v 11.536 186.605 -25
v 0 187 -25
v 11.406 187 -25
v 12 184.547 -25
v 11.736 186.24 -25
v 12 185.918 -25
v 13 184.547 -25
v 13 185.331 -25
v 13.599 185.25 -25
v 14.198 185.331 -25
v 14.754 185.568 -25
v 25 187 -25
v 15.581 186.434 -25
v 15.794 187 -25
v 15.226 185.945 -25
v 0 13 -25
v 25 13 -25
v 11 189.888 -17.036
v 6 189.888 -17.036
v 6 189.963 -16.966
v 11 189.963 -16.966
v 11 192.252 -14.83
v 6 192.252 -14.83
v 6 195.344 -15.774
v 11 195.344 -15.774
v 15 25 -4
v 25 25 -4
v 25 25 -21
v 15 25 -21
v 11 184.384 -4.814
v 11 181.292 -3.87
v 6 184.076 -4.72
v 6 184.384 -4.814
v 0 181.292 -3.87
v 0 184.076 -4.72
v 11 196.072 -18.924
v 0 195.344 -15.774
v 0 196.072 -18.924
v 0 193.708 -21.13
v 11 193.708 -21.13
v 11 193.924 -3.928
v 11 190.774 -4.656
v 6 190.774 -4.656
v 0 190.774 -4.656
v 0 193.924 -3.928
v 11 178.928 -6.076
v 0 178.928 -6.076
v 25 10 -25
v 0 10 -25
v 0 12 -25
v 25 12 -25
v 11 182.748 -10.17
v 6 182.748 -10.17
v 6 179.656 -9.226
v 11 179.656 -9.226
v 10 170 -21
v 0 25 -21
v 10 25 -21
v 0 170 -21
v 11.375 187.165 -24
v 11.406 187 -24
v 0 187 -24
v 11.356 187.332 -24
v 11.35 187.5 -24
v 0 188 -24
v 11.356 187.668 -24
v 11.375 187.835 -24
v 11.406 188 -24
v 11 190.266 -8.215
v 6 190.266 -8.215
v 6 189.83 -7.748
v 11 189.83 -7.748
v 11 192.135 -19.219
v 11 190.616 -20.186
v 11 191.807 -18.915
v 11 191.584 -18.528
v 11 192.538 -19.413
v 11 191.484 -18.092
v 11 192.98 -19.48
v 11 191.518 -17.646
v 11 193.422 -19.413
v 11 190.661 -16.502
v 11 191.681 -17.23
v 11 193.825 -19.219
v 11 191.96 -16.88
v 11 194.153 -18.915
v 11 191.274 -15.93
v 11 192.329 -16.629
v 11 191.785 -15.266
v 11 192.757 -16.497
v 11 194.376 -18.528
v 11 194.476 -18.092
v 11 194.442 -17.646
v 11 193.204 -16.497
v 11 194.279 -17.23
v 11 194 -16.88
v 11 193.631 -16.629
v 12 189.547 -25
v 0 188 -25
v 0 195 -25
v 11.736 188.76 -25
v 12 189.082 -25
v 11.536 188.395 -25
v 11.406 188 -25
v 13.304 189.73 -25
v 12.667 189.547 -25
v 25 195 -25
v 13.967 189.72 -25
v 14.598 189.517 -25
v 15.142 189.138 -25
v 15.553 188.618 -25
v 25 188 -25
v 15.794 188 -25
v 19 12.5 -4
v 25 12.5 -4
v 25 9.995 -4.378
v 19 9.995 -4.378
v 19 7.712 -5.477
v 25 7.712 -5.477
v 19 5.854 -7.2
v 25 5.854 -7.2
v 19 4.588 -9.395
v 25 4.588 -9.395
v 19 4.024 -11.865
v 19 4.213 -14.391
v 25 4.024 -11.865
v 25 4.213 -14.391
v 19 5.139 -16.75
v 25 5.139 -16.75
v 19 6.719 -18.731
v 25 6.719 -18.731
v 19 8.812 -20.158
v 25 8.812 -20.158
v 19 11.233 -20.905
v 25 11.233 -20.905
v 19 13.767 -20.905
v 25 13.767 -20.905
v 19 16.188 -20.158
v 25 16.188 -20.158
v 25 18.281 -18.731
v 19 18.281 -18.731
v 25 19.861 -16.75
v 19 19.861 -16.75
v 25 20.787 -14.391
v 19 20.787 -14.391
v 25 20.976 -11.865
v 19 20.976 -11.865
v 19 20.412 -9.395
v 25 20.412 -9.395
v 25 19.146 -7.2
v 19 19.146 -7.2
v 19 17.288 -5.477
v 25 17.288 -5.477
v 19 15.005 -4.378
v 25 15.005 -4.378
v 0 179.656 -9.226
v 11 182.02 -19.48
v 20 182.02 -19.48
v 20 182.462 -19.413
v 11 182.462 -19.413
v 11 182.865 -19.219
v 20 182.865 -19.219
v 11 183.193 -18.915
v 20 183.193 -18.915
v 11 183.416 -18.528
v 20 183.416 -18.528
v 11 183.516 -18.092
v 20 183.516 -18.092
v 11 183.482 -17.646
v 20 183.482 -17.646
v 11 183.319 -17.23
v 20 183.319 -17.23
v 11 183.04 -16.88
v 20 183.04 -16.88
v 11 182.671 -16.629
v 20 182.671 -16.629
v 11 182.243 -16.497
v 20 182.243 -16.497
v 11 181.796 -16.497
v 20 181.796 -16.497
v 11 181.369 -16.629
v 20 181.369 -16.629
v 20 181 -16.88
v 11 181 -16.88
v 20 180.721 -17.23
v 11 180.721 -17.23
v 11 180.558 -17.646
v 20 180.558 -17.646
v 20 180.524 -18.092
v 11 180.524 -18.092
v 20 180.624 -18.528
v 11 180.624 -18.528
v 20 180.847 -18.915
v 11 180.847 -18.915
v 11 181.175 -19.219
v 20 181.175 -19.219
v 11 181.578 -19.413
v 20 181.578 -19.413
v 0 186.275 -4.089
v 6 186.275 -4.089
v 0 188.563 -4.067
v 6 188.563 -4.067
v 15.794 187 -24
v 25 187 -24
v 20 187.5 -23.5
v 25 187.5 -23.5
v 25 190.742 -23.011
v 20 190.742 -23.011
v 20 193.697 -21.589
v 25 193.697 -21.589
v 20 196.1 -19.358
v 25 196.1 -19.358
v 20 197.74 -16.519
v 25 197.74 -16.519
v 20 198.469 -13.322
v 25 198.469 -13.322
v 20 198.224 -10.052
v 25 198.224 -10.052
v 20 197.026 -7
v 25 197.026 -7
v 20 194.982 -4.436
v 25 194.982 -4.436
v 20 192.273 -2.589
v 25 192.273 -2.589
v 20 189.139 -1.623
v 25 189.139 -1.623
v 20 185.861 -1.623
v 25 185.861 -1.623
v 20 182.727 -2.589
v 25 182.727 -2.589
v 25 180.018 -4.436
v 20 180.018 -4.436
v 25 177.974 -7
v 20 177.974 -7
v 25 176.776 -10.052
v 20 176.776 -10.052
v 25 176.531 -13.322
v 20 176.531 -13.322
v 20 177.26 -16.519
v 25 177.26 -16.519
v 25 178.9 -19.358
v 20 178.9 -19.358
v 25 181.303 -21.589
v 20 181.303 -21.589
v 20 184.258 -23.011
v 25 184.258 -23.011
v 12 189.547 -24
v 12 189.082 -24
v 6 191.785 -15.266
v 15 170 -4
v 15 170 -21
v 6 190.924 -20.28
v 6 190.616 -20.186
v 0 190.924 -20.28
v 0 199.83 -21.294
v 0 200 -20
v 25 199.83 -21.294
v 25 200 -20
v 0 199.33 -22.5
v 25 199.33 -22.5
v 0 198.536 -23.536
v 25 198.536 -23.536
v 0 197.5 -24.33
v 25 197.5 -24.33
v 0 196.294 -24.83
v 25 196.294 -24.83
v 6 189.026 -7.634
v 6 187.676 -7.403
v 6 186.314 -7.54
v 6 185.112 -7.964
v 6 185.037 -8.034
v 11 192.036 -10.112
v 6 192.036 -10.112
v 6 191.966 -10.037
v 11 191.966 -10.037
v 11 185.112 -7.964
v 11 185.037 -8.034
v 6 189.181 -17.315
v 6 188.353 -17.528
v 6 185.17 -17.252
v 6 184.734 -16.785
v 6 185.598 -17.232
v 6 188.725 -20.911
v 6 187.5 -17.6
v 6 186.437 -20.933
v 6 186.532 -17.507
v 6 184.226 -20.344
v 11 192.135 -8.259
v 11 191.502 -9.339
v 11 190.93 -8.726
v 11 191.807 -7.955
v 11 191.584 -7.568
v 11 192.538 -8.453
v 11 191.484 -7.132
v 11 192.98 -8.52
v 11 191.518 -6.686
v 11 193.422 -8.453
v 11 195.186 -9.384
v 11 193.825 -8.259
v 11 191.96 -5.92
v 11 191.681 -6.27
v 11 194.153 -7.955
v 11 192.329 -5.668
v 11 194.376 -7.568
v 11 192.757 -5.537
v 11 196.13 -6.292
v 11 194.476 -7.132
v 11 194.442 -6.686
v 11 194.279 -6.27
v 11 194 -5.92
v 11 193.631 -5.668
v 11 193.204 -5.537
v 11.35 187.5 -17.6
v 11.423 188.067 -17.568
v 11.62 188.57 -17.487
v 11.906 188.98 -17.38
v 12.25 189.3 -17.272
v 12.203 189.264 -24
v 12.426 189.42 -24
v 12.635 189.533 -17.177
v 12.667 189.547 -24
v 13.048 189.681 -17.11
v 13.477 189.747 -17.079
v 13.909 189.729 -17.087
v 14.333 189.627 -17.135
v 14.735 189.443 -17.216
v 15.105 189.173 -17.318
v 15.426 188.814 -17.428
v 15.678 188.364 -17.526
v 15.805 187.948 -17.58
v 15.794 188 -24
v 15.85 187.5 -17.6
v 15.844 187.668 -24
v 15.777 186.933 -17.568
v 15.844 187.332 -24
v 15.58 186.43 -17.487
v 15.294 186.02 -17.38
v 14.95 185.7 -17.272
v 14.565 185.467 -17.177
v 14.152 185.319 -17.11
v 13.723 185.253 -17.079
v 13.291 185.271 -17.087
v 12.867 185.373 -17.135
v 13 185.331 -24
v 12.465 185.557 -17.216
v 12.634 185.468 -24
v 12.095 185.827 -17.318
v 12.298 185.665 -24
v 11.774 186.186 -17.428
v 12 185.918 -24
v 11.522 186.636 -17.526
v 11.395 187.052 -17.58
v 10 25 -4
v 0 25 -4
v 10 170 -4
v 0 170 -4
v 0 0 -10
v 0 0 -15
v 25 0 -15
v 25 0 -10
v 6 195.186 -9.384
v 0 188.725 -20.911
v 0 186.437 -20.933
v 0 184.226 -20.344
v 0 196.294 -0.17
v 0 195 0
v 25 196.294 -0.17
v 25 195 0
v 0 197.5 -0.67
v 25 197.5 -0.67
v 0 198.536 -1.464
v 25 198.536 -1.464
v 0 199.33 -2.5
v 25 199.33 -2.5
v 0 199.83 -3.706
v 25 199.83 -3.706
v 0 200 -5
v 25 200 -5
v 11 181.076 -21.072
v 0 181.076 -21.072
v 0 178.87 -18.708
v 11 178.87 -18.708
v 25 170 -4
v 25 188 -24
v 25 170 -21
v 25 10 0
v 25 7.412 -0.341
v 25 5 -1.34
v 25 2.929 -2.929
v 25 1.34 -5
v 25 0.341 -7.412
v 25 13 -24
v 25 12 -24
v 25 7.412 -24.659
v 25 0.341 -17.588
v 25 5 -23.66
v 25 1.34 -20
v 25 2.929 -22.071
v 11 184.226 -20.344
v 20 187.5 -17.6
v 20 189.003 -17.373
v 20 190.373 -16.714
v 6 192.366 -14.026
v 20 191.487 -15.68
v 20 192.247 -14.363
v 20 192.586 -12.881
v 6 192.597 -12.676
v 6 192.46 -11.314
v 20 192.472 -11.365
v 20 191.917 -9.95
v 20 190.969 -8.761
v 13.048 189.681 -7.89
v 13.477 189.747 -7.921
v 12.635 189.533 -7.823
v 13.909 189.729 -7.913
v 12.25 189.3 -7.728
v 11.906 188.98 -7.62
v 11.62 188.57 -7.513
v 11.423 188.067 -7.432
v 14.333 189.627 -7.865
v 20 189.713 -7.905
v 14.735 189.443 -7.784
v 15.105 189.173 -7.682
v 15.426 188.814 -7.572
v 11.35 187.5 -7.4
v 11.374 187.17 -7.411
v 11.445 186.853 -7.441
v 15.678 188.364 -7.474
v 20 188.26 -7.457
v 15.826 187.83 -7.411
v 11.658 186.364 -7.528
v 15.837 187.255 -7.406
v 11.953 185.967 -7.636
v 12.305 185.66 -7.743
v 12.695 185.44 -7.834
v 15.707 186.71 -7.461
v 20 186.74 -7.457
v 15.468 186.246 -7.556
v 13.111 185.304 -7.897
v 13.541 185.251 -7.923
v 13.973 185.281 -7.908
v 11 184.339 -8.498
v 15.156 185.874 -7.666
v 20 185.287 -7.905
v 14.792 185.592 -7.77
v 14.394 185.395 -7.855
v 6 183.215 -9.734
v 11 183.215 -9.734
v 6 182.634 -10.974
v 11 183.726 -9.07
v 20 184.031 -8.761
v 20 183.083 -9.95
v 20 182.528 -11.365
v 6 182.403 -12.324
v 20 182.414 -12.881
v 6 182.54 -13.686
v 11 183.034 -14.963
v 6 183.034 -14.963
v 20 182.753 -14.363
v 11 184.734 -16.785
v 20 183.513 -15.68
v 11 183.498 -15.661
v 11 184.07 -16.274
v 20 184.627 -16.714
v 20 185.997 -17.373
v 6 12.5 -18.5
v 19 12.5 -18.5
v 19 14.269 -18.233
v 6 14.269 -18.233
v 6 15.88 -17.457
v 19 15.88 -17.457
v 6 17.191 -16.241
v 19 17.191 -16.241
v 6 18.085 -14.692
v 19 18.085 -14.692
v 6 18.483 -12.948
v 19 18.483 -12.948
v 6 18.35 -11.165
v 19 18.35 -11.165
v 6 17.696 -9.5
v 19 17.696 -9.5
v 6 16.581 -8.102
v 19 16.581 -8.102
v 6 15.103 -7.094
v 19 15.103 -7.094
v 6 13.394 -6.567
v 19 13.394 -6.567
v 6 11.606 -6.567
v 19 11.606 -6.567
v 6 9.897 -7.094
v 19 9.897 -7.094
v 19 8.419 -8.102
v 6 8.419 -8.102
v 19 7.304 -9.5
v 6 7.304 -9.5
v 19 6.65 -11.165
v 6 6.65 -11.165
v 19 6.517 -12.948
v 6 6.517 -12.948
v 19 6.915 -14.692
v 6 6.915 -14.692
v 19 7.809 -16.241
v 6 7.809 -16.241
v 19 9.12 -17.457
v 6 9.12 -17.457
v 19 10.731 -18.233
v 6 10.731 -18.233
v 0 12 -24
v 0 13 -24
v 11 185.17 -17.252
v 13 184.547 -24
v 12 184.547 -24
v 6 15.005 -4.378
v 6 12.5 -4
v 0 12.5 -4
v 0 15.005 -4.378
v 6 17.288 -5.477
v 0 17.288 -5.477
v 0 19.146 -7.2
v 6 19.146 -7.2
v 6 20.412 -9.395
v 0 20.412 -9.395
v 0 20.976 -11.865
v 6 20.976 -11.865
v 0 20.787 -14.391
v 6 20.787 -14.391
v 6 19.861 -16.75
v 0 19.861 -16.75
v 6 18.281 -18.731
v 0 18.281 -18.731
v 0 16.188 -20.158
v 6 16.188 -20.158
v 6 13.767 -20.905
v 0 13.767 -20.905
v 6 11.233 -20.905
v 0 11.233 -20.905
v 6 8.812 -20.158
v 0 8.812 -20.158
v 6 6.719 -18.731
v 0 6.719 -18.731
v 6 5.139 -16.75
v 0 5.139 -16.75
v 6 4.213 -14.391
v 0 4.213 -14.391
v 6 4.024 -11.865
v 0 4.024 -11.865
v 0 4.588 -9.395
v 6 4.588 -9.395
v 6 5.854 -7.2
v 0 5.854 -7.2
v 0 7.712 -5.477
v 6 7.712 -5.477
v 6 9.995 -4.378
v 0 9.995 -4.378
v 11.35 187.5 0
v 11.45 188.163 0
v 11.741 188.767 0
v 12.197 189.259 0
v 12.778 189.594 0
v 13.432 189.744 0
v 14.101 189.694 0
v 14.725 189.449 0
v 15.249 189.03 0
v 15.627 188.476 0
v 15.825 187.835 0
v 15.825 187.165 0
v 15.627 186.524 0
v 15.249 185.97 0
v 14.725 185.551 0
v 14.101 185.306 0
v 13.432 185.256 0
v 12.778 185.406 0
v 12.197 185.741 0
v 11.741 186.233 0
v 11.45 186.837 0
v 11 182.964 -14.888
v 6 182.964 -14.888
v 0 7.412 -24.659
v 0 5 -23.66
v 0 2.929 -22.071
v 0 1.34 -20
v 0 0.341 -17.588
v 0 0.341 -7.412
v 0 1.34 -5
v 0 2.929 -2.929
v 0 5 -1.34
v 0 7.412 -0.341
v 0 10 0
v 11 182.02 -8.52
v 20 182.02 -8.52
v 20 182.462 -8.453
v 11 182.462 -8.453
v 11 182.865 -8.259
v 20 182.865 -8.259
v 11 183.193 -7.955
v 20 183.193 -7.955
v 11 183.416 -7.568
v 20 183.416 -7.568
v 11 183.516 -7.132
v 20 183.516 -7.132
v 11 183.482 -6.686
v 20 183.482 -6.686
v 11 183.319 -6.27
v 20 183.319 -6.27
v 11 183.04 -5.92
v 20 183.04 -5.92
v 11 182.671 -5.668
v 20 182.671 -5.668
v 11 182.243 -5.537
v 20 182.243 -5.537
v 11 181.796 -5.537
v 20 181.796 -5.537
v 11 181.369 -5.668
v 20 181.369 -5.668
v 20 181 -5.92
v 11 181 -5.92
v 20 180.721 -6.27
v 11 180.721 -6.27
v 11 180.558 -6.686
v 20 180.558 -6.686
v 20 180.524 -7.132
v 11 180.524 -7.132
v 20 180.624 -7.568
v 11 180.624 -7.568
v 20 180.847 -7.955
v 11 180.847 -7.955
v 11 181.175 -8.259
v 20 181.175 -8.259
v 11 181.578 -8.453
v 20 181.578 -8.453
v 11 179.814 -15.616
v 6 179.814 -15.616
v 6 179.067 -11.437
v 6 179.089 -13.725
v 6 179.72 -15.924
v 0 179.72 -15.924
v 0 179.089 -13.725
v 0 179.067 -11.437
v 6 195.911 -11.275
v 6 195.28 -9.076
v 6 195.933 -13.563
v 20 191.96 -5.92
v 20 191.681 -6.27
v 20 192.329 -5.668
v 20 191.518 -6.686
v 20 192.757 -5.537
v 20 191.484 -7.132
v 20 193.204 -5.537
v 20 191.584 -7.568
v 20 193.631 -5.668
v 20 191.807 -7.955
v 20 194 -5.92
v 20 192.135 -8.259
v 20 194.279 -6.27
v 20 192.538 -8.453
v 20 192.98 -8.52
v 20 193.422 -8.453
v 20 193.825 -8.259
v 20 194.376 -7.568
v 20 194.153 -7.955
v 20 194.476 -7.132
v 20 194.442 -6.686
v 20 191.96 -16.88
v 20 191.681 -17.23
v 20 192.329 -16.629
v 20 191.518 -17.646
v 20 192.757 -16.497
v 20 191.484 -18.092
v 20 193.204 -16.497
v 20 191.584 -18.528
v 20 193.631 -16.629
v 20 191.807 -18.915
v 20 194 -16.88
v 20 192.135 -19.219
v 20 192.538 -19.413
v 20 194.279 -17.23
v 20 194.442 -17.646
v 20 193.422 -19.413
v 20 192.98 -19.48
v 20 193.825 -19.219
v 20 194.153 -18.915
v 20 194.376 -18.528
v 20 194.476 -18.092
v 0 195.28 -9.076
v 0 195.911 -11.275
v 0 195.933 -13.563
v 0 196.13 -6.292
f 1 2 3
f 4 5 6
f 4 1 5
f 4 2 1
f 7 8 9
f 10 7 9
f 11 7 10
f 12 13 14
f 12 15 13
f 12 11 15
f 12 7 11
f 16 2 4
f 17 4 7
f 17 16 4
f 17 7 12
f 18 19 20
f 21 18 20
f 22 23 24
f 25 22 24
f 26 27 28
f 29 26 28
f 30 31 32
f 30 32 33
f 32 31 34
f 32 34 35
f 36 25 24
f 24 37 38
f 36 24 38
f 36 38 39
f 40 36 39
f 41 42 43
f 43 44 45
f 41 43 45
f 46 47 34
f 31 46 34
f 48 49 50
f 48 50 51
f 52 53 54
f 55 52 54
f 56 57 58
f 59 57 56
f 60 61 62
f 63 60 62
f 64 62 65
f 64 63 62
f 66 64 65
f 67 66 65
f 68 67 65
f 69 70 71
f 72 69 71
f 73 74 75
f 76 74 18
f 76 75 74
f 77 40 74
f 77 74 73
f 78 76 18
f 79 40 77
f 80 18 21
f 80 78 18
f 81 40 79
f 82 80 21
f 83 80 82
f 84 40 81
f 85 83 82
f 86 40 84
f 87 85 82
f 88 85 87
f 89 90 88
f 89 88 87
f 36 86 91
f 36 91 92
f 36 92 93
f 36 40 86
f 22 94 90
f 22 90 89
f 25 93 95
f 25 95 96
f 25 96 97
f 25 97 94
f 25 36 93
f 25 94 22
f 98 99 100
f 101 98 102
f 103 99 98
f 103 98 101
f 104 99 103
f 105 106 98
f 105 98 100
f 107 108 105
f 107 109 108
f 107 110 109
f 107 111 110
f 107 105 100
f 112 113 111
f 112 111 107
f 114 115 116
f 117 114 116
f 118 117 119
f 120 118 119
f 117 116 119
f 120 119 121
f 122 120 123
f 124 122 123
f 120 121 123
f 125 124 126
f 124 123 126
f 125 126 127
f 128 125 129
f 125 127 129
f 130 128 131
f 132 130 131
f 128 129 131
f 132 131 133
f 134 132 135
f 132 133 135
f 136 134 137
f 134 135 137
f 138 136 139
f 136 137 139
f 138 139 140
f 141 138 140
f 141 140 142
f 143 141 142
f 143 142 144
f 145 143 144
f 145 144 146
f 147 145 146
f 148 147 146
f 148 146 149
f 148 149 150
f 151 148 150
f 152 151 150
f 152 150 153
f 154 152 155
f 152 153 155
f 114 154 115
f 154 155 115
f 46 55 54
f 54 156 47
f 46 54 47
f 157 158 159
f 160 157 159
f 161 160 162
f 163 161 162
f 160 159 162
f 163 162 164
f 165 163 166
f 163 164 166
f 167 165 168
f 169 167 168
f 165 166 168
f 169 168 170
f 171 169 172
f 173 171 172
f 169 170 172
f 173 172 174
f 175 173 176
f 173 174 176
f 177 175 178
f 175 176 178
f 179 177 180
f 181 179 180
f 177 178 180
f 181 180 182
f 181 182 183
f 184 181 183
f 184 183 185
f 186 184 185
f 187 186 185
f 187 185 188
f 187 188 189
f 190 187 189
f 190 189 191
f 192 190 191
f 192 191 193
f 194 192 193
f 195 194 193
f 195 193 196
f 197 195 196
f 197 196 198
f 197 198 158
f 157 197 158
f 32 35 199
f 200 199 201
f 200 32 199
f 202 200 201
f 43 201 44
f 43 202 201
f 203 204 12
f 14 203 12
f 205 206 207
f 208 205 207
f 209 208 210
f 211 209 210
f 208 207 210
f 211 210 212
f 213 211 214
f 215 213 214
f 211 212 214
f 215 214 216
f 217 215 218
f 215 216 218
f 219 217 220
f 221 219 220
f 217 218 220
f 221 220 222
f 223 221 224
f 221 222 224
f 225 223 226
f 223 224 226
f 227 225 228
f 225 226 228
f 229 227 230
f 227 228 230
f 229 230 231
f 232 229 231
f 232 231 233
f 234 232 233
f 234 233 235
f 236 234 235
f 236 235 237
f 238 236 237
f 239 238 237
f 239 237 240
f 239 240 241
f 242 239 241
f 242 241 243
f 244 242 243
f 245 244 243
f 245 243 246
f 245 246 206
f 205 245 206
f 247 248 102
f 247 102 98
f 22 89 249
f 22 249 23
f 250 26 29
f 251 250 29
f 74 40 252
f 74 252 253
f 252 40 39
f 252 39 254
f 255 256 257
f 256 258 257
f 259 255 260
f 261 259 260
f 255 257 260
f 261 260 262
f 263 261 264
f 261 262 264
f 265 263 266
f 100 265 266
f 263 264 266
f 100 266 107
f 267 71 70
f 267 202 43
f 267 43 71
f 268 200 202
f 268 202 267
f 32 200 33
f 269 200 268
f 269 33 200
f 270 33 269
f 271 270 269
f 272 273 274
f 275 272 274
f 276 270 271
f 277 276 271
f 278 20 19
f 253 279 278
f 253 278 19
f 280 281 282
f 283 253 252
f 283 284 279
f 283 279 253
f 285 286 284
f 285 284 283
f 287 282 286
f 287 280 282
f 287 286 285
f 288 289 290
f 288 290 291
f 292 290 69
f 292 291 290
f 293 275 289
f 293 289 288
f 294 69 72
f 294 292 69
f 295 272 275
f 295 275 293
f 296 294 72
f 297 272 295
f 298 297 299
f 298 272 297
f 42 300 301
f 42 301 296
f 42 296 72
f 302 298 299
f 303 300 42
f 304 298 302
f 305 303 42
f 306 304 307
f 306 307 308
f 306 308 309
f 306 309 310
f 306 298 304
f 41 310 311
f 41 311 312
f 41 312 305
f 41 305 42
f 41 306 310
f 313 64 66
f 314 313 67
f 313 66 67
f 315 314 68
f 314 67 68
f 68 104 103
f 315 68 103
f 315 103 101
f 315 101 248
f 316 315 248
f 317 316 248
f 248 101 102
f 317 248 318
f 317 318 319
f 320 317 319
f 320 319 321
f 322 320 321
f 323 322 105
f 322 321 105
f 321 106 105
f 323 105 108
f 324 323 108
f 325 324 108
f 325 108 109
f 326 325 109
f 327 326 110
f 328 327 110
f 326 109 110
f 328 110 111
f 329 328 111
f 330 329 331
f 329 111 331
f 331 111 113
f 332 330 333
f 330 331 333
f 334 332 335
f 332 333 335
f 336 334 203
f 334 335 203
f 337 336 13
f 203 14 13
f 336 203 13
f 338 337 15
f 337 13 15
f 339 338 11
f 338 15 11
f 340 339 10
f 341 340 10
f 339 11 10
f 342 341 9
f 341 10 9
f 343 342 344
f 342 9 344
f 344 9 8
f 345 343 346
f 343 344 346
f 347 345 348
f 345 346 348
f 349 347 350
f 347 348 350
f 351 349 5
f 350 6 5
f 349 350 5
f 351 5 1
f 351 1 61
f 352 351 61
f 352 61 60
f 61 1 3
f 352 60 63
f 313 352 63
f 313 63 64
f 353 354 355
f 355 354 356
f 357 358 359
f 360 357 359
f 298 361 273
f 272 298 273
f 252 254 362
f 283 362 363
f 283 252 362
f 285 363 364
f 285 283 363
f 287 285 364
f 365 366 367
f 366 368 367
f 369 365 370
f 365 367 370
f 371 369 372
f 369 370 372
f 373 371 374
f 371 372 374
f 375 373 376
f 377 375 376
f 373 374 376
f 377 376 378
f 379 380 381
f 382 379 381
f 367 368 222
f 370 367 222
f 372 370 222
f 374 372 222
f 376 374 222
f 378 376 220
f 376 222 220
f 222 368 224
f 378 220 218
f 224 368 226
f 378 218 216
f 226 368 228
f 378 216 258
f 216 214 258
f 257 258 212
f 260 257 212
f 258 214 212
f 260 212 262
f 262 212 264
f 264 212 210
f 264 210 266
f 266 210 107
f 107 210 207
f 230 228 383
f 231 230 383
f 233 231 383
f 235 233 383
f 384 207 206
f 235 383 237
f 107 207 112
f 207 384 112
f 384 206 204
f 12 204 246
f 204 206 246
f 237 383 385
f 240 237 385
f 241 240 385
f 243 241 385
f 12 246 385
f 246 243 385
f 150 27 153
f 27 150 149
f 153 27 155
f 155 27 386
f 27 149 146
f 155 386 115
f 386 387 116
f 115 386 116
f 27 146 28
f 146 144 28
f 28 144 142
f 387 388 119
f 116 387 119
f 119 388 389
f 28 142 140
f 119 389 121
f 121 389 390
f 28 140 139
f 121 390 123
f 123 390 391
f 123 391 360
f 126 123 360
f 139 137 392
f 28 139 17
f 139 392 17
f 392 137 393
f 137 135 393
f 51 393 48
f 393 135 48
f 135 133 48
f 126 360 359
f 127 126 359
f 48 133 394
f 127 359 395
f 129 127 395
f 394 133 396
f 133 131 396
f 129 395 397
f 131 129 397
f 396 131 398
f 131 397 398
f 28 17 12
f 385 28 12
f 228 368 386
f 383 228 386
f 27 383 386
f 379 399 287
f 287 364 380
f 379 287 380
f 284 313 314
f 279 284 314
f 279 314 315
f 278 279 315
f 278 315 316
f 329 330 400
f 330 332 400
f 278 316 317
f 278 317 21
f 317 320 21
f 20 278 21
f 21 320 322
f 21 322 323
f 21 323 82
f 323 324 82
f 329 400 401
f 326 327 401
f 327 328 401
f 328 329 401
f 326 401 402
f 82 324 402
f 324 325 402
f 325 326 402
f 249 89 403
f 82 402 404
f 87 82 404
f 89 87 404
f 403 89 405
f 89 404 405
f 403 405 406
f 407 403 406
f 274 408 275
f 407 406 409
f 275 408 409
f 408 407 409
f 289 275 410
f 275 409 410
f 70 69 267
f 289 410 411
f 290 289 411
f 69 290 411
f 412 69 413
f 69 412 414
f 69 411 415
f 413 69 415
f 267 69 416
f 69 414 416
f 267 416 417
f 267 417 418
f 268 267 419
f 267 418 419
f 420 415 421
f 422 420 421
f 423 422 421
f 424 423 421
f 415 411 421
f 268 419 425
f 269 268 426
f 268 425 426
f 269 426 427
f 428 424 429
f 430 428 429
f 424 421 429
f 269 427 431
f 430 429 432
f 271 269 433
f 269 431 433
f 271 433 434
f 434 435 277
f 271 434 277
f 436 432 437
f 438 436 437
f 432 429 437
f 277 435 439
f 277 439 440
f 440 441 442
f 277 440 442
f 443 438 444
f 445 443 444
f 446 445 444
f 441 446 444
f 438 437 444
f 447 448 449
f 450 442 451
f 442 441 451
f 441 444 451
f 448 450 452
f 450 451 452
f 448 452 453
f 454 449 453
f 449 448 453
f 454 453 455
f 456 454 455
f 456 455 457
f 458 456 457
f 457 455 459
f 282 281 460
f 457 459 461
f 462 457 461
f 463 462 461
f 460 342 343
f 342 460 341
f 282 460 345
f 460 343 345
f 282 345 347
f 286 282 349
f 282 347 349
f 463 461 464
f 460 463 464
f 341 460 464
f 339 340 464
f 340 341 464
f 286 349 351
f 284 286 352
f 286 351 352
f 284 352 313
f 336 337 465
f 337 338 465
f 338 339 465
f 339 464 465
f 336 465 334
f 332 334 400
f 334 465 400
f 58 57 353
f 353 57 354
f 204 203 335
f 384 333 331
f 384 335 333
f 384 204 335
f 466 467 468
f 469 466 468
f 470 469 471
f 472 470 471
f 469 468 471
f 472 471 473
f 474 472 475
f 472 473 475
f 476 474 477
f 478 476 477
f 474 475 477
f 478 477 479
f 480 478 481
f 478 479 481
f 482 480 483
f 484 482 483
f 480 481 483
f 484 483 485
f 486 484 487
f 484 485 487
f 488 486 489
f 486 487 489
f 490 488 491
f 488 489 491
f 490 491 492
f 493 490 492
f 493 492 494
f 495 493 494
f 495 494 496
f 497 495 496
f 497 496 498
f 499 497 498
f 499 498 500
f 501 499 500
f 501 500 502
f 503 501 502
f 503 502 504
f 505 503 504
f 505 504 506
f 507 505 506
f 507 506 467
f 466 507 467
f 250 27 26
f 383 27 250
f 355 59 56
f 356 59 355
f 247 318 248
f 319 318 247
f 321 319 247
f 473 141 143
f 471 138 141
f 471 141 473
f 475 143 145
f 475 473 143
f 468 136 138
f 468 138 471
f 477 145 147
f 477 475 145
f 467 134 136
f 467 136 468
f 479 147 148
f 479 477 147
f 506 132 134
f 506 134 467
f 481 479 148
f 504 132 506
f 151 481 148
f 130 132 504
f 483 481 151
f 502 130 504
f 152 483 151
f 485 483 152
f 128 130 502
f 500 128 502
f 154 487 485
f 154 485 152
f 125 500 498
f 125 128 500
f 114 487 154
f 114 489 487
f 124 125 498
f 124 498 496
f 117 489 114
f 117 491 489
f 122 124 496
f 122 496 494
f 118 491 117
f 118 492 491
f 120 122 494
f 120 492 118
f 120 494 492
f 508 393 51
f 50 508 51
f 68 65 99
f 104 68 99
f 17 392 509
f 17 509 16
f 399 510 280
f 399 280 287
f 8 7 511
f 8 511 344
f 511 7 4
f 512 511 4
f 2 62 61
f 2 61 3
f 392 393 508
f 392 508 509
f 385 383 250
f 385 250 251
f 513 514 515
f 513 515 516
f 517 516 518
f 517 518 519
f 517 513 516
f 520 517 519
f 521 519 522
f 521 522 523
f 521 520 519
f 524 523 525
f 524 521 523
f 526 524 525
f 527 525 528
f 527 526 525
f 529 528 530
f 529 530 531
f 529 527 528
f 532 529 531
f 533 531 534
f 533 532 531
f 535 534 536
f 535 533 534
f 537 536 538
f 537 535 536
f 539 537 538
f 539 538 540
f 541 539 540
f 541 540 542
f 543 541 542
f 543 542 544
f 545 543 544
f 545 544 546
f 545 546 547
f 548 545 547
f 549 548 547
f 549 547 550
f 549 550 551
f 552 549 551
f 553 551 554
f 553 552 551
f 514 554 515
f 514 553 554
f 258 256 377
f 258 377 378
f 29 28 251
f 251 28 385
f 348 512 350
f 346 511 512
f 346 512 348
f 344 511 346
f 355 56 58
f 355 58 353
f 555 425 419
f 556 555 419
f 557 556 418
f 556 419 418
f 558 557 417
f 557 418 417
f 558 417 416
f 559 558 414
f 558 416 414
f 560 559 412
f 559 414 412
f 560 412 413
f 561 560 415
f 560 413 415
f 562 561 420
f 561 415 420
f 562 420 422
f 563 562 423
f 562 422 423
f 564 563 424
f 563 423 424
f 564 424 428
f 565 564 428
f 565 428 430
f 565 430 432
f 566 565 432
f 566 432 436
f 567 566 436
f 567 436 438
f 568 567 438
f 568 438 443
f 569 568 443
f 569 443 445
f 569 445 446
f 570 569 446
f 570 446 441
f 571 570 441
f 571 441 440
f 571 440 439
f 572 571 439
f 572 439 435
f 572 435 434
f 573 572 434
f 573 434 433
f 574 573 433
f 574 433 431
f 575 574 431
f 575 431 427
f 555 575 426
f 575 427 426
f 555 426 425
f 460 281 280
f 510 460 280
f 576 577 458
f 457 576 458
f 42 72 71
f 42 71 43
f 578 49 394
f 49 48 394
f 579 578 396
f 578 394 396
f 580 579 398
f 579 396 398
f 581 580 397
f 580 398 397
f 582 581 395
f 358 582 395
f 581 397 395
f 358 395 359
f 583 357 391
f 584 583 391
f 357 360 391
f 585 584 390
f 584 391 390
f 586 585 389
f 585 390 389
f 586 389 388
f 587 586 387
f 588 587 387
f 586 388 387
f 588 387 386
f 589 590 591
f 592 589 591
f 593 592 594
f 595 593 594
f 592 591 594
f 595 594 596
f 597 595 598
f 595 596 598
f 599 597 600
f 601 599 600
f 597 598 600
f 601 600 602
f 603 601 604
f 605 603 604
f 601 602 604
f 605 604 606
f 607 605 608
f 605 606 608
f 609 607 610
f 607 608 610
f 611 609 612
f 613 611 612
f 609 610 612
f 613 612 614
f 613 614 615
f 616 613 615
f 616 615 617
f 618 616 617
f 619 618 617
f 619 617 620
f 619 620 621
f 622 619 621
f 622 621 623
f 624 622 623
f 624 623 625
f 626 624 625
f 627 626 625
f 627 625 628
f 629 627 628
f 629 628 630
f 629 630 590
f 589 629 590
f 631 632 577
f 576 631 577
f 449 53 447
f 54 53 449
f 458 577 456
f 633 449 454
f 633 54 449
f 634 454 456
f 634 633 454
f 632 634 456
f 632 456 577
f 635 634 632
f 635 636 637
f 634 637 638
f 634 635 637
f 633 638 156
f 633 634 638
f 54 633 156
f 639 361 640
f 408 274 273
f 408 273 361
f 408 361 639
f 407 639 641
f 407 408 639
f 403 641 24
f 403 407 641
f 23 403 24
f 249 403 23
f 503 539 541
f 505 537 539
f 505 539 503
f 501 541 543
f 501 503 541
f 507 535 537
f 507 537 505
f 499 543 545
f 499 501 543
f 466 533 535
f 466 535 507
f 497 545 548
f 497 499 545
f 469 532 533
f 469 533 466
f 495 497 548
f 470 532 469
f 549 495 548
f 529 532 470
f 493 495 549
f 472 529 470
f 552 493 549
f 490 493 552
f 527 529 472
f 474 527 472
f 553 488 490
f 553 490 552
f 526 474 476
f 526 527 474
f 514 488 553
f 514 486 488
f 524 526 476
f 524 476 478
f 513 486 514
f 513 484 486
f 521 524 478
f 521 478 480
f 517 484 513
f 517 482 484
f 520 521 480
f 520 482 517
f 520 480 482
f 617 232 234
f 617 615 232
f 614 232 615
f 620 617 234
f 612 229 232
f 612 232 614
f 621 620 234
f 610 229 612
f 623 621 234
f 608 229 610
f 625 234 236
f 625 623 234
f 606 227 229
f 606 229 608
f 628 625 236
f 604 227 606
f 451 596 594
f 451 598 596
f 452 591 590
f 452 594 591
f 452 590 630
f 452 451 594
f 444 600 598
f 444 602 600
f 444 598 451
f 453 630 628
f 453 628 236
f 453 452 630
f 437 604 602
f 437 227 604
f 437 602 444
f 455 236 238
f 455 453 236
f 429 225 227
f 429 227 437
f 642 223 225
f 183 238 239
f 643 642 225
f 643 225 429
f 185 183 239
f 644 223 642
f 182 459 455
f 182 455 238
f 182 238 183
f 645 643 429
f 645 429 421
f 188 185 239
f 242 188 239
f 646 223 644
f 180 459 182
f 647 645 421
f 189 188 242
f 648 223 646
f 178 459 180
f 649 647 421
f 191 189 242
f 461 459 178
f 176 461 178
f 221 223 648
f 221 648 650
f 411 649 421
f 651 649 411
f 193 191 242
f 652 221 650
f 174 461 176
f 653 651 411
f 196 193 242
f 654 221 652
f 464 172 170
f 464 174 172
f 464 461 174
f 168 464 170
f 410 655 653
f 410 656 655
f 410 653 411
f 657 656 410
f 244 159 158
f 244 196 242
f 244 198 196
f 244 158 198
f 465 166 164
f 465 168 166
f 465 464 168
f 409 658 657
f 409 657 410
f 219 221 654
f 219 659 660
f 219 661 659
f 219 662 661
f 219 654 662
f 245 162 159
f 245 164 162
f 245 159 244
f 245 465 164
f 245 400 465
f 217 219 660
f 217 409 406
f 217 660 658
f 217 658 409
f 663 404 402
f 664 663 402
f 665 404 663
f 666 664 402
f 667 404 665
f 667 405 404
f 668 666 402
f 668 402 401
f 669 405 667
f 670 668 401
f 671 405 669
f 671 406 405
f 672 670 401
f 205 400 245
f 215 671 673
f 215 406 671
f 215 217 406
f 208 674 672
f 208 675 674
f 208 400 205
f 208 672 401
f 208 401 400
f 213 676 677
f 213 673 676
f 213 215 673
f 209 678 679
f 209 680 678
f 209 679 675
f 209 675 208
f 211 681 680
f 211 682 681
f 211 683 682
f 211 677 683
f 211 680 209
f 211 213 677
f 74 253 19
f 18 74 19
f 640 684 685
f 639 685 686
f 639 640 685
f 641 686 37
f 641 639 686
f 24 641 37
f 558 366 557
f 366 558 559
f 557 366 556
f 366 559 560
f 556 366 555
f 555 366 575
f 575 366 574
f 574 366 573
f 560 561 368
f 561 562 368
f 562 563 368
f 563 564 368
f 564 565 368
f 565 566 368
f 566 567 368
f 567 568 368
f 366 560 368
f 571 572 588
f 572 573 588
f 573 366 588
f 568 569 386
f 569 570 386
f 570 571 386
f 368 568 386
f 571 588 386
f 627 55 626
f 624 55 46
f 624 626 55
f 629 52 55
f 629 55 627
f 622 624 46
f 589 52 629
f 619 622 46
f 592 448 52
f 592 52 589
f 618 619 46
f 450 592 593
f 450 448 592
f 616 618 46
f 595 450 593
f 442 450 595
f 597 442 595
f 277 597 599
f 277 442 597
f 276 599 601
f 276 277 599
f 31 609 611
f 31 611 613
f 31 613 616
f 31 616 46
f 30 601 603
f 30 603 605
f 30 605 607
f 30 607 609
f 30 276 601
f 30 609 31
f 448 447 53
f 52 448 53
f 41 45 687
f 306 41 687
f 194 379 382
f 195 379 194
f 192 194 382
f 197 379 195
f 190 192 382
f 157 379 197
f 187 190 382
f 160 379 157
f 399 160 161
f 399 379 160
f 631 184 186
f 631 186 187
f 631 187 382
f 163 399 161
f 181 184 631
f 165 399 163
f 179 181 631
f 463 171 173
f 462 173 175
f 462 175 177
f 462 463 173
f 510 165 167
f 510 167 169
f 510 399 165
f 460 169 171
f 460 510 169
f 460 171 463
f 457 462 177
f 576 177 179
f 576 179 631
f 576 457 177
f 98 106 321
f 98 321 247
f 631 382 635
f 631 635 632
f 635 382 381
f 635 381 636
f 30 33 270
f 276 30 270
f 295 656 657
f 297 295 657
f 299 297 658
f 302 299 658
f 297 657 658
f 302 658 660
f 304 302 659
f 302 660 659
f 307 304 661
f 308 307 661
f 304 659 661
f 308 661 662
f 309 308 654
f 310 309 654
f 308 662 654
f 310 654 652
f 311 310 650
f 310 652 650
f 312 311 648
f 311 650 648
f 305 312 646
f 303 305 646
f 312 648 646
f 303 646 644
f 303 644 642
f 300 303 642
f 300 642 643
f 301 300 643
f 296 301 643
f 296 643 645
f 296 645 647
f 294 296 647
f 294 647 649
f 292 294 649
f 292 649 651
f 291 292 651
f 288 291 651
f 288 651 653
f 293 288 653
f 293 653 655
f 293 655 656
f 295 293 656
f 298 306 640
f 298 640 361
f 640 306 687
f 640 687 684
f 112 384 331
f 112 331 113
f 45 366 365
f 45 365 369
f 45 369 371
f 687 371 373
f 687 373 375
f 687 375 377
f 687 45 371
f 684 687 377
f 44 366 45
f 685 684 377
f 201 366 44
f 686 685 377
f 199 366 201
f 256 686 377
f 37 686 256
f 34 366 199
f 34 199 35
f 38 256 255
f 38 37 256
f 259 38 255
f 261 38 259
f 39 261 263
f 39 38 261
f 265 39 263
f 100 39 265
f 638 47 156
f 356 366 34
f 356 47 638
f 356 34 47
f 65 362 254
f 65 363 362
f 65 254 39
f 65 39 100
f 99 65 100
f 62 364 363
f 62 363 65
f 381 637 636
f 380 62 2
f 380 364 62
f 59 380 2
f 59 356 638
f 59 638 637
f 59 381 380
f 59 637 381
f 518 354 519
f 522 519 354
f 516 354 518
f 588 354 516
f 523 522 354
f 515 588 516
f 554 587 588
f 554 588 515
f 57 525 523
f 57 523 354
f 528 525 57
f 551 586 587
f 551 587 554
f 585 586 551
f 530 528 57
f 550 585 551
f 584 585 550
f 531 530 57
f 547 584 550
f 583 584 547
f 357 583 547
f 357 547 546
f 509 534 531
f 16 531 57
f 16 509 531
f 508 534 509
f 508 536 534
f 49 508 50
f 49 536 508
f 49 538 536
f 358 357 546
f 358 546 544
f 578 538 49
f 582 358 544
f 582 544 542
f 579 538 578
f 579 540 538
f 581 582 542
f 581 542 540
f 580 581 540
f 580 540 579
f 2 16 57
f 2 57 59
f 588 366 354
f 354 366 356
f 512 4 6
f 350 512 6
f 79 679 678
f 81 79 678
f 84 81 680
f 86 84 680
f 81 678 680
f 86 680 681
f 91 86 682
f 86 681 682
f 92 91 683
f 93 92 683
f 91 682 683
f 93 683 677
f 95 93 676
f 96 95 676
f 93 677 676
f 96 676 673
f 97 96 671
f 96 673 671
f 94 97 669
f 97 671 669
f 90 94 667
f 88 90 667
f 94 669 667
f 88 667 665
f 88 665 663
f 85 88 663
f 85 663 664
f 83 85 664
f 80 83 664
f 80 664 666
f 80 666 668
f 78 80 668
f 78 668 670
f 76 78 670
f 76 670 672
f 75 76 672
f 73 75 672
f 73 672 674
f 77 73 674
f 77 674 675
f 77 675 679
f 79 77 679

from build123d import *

# Parameters (mm, degrees)
CROQUIS1_W              = 25
CROQUIS1_H              = 25
SALIENTE_EXTRUIR1_DEPTH = 200
REDONDEO1_R             = 10
REDONDEO2_R             = 10
REDONDEO3_R             = 5
REDONDEO4_R             = 5
CROQUIS2_R              = 11
CROQUIS2_R_2            = 8.5
CORTAR_EXTRUIR1_DEPTH   = 6
CORTAR_EXTRUIR2_START   = -6
CROQUIS3_R              = 8.5
CORTAR_EXTRUIR2_DEPTH   = 6
CROQUIS9_R              = 5.1
CROQUIS9_R_2            = 6
CORTAR_EXTRUIR6_DEPTH   = 30
CROQUIS13_W             = 1
CROQUIS13_H             = 5
CORTAR_EXTRUIR8_DEPTH   = 1
SALIENTE_EXTRUIR3_START = 1
CROQUIS14_R             = 11
CROQUIS14_R_2           = 5.1
SALIENTE_EXTRUIR3_DEPTH = 1
CROQUIS15_R             = 1.5
CORTAR_EXTRUIR9_DEPTH   = 16
CORTAR_EXTRUIR10_DEPTH  = 11
CORTAR_EXTRUIR12_REACH  = 205.101
CROQUIS18_W             = 1
CROQUIS18_H             = 1
CROQUIS19_W             = 17
CROQUIS19_H             = 145
CORTAR_EXTRUIR13_DEPTH  = 10
CROQUIS20_W             = 17
CROQUIS20_H             = 145
CORTAR_EXTRUIR14_DEPTH  = 10
CROQUIS12_R             = 2.25
CORTAR_EXTRUIR7_DEPTH   = 204.100960116


with BuildPart() as part:
    # Croquis1 → Saliente-Extruir1 (new body)
    with BuildSketch(Plane(origin=(0, 0, 0), x_dir=(1, 0, 0), z_dir=(0, 1, 0))):
        with Locations((12.5, 12.5)):
            Rectangle(CROQUIS1_W, CROQUIS1_H)
    extrude(amount=SALIENTE_EXTRUIR1_DEPTH)

    # Redondeo1
    redondeo1_edges = [part.edges().sort_by_distance(p)[0] for p in [
        (12.5, 0, -25),
    ]]
    fillet(redondeo1_edges, radius=REDONDEO1_R)

    # Redondeo2
    redondeo2_edges = [part.edges().sort_by_distance(p)[0] for p in [
        (12.5, 0, 0),
    ]]
    fillet(redondeo2_edges, radius=REDONDEO2_R)

    # Redondeo3
    redondeo3_edges = [part.edges().sort_by_distance(p)[0] for p in [
        (12.5, 200, 0),
    ]]
    fillet(redondeo3_edges, radius=REDONDEO3_R)

    # Redondeo4
    redondeo4_edges = [part.edges().sort_by_distance(p)[0] for p in [
        (12.5, 200, -25),
    ]]
    fillet(redondeo4_edges, radius=REDONDEO4_R)

    # Croquis2 → Cortar-Extruir1 (cut)
    with BuildSketch(Plane(origin=(25, 0, 0), x_dir=(0, 0, -1), z_dir=(1, 0, 0))):
        with Locations((12.5, 187.5)):
            Circle(CROQUIS2_R)
        with Locations(Location((12.5, 12.5, 0), (0, 0, 180))):
            Circle(CROQUIS2_R_2)
    extrude(amount=-CORTAR_EXTRUIR1_DEPTH, mode=Mode.SUBTRACT)

    # Croquis3 → Cortar-Extruir2 (cut)
    with BuildSketch(Plane.ZY.offset(CORTAR_EXTRUIR2_START)):
        with Locations((-12.5, 12.5)):
            Circle(CROQUIS3_R)
        with Locations(Location((-12.5, 187.5, 0), (0, 0, 180))):
            Circle(CROQUIS3_R)
    extrude(amount=CORTAR_EXTRUIR2_DEPTH, mode=Mode.SUBTRACT)

    # Croquis9 → Cortar-Extruir6 (cut)
    with BuildSketch(Plane(origin=(19, 0, 0), x_dir=(0, 0, -1), z_dir=(1, 0, 0))):
        with Locations((12.5, 187.5)):
            Circle(CROQUIS9_R)
        with Locations((12.5, 12.5)):
            Circle(CROQUIS9_R_2)
    extrude(amount=-CORTAR_EXTRUIR6_DEPTH, mode=Mode.SUBTRACT)

    # Croquis13 → Cortar-Extruir8 (cut)
    with BuildSketch(Plane(origin=(0, 0, -25), x_dir=(-1, 0, 0), z_dir=(0, 0, -1))):
        with Locations((-12.5, 187.04733642)):
            Rectangle(CROQUIS13_W, CROQUIS13_H)
    extrude(amount=-CORTAR_EXTRUIR8_DEPTH, mode=Mode.SUBTRACT)

    # Croquis14 → Saliente-Extruir3 (add)
    with BuildSketch(Plane(origin=(19, 0, 0), x_dir=(0, 0, -1), z_dir=(1, 0, 0)).offset(SALIENTE_EXTRUIR3_START)):
        with Locations((12.5, 187.5)):
            Circle(CROQUIS14_R)
        with Locations((12.5, 187.5)):
            Circle(CROQUIS14_R_2, mode=Mode.SUBTRACT)
    extrude(amount=-SALIENTE_EXTRUIR3_DEPTH)

    # Croquis15 → Cortar-Extruir9 (cut)
    with BuildSketch(Plane(origin=(20, 0, 0), x_dir=(0, 0, -1), z_dir=(1, 0, 0))):
        with Locations((17.980077554, 182.019922446)):
            Circle(CROQUIS15_R)
        with Locations((7.019922446, 182.019922446)):
            Circle(CROQUIS15_R)
        with Locations((7.019922446, 192.980077554)):
            Circle(CROQUIS15_R)
        with Locations((17.980077554, 192.980077554)):
            Circle(CROQUIS15_R)
    extrude(amount=-CORTAR_EXTRUIR9_DEPTH, mode=Mode.SUBTRACT)

    # Croquis16 → Cortar-Extruir10 (cut)
    with BuildSketch(Plane.ZY):
        Polygon((-14.829996635, 192.251844396), (-15.774368679, 195.344011075), (-18.924449599, 196.072244234), (-21.130158474, 193.708310713), (-20.185786429, 190.616144033), (-17.035705509, 189.887910875), align=None)
        Polygon((-17.251844396, 185.170003365), (-20.344011075, 184.225631321), (-21.072244234, 181.075550401), (-18.708310713, 178.869841526), (-15.616144033, 179.814213571), (-14.887910875, 182.964294491), align=None)
        Polygon((-7.748155604, 189.829996635), (-4.655988925, 190.774368679), (-3.927755766, 193.924449599), (-6.291689287, 196.130158474), (-9.383855967, 195.185786429), (-10.112089125, 192.035705509), align=None)
        Polygon((-10.170003365, 182.748155604), (-9.225631321, 179.655988925), (-6.075550401, 178.927755766), (-3.869841526, 181.291689287), (-4.814213571, 184.383855967), (-7.964294491, 185.112089125), align=None)
    extrude(amount=-CORTAR_EXTRUIR10_DEPTH, mode=Mode.SUBTRACT)

    # Cortar-Extruir12: up to this face of the body (flat: up to its plane)
    cortar_extruir12_end = Plane(part.part.faces().sort_by_distance((0, 99.909973265, -12.5))[0])
    # Croquis18 → Cortar-Extruir12 (cut, up to the picked face)
    with BuildSketch(Plane(origin=(25, 0, 0), x_dir=(0, 0, -1), z_dir=(1, 0, 0)), mode=Mode.PRIVATE) as cortar_extruir12_sk1:
        with Locations((24.5, 187.5)):
            Rectangle(CROQUIS18_W, CROQUIS18_H)
    cortar_extruir12_tool1 = split(extrude(cortar_extruir12_sk1.sketch, amount=-CORTAR_EXTRUIR12_REACH, mode=Mode.PRIVATE), bisect_by=cortar_extruir12_end, keep=Keep.BOTH, mode=Mode.PRIVATE)
    # Croquis18 → Cortar-Extruir12 (cut, up to the picked face)
    with BuildSketch(Plane(origin=(25, 0, 0), x_dir=(0, 0, -1), z_dir=(1, 0, 0)), mode=Mode.PRIVATE) as cortar_extruir12_sk2:
        with Locations((24.5, 12.5)):
            Rectangle(CROQUIS18_W, CROQUIS18_H)
    cortar_extruir12_tool2 = split(extrude(cortar_extruir12_sk2.sketch, amount=-CORTAR_EXTRUIR12_REACH, mode=Mode.PRIVATE), bisect_by=cortar_extruir12_end, keep=Keep.BOTH, mode=Mode.PRIVATE)
    add(cortar_extruir12_tool1.solids().sort_by(Axis((25, 187.5, -24.5), (-1, 0, 0)))[0], mode=Mode.SUBTRACT)
    add(cortar_extruir12_tool2.solids().sort_by(Axis((25, 12.5, -24.5), (-1, 0, 0)))[0], mode=Mode.SUBTRACT)

    # Croquis19 → Cortar-Extruir13 (cut)
    with BuildSketch(Plane(origin=(25, 0, 0), x_dir=(0, 0, -1), z_dir=(1, 0, 0))):
        with Locations((12.5, 97.5)):
            Rectangle(CROQUIS19_W, CROQUIS19_H)
    extrude(amount=-CORTAR_EXTRUIR13_DEPTH, mode=Mode.SUBTRACT)

    # Croquis20 → Cortar-Extruir14 (cut)
    with BuildSketch(Plane.ZY):
        with Locations((-12.5, 97.5)):
            Rectangle(CROQUIS20_W, CROQUIS20_H)
    extrude(amount=-CORTAR_EXTRUIR14_DEPTH, mode=Mode.SUBTRACT)

    # Croquis12 → Cortar-Extruir7 (cut, through all)
    with BuildSketch(Plane(origin=(0, 0, -25), x_dir=(-1, 0, 0), z_dir=(0, 0, -1))):
        with Locations((-13.6, 187.5)):
            Circle(CROQUIS12_R)
    extrude(amount=-CORTAR_EXTRUIR7_DEPTH, mode=Mode.SUBTRACT)


solid = part.part
